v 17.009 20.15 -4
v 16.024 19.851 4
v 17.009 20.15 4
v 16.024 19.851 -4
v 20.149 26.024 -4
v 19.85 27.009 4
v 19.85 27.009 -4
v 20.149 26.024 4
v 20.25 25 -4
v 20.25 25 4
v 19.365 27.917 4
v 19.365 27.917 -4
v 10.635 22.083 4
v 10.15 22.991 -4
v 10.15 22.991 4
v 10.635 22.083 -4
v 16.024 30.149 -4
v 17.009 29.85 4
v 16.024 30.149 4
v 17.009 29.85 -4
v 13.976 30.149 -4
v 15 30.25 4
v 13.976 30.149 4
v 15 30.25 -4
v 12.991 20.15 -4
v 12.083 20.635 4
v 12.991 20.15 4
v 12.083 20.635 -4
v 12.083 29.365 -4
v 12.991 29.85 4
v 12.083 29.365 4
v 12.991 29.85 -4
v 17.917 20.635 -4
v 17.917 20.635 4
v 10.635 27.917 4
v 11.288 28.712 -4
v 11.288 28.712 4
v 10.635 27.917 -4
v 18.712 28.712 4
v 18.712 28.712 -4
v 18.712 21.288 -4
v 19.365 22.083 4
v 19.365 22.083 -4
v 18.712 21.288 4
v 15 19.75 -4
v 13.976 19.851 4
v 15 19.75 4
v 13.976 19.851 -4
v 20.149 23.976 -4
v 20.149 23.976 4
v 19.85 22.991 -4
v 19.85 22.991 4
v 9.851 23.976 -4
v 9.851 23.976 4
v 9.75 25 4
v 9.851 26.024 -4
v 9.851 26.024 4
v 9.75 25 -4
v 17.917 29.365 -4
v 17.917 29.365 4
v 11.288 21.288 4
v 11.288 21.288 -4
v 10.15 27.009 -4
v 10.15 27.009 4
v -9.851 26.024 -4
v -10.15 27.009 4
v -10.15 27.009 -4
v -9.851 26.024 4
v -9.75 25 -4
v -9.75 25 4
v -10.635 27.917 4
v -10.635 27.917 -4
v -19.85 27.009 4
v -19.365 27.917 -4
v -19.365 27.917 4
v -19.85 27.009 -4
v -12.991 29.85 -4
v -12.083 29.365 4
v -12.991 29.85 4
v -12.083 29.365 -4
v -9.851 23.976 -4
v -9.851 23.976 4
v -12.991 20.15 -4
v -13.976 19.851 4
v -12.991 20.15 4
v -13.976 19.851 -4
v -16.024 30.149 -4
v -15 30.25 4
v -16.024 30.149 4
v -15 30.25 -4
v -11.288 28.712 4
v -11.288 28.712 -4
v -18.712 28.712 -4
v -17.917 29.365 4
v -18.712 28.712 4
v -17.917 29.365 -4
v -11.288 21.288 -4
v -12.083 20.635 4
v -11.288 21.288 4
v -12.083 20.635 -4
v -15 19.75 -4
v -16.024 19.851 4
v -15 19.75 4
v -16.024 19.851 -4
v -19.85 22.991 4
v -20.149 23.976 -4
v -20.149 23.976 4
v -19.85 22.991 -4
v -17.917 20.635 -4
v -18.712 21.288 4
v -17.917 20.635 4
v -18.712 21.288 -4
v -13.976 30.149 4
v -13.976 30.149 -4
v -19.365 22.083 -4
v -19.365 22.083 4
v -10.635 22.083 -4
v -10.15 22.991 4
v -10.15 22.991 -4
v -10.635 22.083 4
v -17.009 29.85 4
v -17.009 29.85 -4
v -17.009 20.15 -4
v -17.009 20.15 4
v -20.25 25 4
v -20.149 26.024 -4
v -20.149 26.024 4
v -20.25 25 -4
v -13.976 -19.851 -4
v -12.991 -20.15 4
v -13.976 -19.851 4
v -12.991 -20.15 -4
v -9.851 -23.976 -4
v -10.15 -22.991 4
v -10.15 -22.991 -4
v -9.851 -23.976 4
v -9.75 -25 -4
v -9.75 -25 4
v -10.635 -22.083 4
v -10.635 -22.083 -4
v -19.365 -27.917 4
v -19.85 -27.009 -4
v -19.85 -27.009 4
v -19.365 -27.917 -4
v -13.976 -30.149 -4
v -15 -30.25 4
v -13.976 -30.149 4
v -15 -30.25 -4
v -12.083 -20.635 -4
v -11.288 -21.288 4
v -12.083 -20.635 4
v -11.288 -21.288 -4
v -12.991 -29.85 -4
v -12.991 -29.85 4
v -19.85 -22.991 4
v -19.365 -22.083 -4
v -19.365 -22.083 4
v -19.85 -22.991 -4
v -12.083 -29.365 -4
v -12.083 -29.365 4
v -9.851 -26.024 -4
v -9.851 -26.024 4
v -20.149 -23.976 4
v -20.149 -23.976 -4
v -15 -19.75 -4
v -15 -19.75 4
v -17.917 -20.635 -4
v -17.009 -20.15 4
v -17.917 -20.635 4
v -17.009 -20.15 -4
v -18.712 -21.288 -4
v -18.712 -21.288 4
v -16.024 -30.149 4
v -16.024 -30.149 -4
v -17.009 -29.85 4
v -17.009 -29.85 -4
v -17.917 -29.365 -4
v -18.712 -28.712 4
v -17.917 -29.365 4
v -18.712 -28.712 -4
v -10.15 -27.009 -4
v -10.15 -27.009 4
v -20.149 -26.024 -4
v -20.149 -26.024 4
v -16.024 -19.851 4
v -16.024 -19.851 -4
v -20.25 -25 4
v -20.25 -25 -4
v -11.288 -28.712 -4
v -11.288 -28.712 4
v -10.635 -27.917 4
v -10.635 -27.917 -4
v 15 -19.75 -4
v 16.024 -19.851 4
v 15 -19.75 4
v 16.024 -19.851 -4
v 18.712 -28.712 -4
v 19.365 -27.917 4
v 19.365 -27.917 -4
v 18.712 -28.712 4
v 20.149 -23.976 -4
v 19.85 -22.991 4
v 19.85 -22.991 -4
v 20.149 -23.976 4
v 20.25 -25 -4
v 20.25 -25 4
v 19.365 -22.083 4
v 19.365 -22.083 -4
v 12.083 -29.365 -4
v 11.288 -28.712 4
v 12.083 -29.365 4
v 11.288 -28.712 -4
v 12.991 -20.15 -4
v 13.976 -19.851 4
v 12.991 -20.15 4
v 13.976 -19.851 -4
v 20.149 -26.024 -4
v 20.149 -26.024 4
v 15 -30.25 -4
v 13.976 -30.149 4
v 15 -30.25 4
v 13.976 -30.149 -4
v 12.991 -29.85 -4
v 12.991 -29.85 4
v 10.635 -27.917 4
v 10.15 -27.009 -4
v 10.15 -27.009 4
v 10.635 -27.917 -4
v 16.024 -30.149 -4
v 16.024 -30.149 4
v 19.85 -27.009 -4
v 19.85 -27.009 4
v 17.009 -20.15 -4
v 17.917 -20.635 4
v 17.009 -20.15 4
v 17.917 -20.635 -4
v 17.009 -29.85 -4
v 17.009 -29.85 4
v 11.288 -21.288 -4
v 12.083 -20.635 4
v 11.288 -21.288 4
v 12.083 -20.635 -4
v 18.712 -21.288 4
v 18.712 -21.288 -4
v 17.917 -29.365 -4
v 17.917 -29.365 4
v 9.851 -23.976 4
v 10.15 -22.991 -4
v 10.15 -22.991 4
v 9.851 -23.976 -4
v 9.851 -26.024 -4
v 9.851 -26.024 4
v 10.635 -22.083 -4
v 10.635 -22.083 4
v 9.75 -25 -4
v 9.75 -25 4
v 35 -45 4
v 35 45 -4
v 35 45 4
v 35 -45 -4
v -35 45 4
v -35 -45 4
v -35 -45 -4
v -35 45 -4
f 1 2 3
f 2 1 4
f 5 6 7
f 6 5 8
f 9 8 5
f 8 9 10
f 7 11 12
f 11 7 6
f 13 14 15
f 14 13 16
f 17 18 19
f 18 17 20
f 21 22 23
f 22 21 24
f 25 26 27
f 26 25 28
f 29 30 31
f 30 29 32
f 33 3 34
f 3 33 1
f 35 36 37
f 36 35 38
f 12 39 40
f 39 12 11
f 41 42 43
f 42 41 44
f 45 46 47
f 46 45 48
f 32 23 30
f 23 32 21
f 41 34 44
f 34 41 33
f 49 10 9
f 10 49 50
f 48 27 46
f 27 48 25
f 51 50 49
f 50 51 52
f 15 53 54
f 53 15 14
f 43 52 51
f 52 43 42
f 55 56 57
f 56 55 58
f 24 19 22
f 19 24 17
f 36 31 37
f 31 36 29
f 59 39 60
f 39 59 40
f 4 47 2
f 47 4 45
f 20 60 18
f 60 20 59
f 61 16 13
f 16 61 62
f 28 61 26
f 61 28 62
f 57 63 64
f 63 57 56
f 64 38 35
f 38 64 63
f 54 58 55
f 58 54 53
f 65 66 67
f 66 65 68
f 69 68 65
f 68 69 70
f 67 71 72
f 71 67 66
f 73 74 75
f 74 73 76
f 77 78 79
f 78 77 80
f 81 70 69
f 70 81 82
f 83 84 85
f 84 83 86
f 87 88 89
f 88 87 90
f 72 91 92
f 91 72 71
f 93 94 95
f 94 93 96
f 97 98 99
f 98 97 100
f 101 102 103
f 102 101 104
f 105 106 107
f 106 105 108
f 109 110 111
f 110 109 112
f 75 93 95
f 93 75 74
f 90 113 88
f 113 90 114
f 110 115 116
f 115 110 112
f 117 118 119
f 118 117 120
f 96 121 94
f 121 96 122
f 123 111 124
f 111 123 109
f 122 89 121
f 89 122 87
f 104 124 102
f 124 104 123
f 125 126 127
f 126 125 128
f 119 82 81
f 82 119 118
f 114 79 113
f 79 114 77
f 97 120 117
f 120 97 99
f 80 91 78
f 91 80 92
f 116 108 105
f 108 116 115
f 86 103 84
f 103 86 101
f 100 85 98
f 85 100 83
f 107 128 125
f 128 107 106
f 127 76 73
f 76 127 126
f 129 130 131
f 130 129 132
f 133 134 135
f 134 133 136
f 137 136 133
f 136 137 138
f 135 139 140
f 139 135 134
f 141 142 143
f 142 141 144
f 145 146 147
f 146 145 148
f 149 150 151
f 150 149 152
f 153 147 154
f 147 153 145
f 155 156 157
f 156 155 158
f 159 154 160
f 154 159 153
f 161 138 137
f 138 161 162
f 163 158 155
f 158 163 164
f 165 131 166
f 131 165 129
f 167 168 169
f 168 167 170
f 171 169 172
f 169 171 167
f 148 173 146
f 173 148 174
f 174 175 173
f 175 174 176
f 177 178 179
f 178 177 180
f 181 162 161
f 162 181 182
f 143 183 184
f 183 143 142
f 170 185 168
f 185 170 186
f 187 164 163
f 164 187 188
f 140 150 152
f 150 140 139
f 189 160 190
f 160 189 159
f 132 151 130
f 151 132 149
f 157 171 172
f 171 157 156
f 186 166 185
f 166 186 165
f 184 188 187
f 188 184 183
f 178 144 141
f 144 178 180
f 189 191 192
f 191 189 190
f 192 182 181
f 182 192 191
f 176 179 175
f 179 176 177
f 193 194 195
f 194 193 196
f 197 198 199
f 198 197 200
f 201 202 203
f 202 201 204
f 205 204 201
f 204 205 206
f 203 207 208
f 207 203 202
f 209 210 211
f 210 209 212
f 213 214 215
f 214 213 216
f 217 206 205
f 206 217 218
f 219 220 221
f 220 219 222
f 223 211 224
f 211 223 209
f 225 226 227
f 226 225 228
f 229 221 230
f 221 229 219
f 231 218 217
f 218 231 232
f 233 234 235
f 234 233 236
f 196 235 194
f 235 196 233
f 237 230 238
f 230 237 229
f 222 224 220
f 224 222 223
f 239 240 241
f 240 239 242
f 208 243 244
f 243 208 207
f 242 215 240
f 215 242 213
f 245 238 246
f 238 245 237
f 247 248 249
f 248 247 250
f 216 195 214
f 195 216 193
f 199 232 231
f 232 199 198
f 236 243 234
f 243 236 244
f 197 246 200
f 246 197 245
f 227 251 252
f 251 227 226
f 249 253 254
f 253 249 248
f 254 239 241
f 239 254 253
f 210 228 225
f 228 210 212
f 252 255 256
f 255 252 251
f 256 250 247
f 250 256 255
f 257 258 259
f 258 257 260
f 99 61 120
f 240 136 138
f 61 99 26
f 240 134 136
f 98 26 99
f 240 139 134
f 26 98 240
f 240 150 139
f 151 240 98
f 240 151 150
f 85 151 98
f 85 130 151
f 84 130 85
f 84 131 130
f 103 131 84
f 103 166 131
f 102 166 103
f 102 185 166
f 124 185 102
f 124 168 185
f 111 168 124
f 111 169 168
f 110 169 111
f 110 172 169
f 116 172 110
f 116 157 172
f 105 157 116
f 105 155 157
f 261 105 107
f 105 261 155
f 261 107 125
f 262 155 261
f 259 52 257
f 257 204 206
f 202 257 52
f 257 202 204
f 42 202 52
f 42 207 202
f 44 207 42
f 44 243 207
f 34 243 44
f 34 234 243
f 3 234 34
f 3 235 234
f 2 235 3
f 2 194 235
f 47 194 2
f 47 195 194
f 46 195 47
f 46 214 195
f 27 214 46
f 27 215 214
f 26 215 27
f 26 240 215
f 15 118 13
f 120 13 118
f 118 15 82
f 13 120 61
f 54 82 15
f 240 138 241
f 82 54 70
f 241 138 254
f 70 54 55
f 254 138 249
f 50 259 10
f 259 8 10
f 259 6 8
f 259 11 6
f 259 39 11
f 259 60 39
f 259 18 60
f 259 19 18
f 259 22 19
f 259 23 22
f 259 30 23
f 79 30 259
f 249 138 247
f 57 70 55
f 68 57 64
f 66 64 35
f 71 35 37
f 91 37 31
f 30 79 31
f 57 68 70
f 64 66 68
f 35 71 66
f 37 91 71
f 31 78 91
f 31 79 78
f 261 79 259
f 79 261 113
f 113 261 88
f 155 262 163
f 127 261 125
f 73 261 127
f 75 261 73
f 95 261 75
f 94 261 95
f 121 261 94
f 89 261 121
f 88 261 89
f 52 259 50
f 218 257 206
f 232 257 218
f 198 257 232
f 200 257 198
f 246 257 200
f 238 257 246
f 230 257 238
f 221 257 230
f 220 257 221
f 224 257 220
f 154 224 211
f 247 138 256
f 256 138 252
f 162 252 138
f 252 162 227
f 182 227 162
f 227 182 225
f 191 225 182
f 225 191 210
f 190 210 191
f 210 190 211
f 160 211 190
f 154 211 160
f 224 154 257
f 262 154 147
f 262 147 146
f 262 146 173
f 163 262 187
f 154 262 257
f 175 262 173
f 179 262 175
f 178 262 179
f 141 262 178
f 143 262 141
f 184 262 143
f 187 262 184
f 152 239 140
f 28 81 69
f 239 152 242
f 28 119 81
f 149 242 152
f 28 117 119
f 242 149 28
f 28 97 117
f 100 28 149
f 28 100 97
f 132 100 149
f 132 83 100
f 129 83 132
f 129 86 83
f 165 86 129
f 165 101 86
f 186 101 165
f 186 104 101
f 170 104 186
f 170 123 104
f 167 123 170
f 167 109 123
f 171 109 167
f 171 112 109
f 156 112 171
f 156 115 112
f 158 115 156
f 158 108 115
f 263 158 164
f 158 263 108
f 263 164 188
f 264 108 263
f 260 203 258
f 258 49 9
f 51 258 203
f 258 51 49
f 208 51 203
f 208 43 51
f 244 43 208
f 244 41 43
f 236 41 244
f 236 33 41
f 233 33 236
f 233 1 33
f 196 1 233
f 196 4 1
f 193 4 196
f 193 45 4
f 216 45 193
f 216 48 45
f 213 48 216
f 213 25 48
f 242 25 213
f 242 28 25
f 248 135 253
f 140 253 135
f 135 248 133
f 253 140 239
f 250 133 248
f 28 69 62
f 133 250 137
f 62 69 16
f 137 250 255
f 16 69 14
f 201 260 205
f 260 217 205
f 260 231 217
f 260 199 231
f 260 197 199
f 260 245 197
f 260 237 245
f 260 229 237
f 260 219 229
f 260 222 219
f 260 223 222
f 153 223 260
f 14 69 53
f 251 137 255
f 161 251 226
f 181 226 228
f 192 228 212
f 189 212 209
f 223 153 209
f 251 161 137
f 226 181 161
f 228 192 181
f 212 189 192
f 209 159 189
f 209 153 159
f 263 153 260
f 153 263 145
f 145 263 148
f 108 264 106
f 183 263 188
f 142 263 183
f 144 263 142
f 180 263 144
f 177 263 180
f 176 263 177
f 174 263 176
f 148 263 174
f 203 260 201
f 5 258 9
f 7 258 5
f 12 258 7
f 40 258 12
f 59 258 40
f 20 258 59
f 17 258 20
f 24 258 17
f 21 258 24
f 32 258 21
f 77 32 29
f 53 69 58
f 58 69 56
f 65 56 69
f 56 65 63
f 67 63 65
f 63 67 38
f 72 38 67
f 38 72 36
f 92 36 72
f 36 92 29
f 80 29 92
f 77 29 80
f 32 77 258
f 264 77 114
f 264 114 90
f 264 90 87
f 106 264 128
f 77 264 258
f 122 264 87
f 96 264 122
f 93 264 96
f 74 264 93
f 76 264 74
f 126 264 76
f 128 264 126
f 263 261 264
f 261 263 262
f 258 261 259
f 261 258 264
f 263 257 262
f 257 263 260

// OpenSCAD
$fn = 32;

// ----------------------------------------------------------------------
// Corner plate 70 x 90 x 8
// 4 holes, centres taken from the edge offset
// ----------------------------------------------------------------------

// --- parameters (mm) ---
plate = [70, 90, 8];  // overall size (x, y, z)
holes = 4;            // number of holes the drawing asks for
hole_d = 10.5;        // hole diameter
edge = 20;            // hole centre offset from the plate edge

// --- derived feature positions (mm) ---
corner_x = plate[0] / 2 - edge;  // = 15   corner hole X
corner_y = plate[1] / 2 - edge;  // = 25   corner hole Y
feature_centers = [
  [corner_x, corner_y],
  [-corner_x, corner_y],
  [-corner_x, -corner_y],
  [corner_x, -corner_y]
];   // hole centres the loop below drills

// plate outline, every hole drilled through with the same cutters
difference() {
  cube(plate, center = true);
  for (centre = feature_centers)
    translate([centre[0], centre[1], 0])
      cylinder(d = hole_d, h = plate[2] + 2, center = true);
}
